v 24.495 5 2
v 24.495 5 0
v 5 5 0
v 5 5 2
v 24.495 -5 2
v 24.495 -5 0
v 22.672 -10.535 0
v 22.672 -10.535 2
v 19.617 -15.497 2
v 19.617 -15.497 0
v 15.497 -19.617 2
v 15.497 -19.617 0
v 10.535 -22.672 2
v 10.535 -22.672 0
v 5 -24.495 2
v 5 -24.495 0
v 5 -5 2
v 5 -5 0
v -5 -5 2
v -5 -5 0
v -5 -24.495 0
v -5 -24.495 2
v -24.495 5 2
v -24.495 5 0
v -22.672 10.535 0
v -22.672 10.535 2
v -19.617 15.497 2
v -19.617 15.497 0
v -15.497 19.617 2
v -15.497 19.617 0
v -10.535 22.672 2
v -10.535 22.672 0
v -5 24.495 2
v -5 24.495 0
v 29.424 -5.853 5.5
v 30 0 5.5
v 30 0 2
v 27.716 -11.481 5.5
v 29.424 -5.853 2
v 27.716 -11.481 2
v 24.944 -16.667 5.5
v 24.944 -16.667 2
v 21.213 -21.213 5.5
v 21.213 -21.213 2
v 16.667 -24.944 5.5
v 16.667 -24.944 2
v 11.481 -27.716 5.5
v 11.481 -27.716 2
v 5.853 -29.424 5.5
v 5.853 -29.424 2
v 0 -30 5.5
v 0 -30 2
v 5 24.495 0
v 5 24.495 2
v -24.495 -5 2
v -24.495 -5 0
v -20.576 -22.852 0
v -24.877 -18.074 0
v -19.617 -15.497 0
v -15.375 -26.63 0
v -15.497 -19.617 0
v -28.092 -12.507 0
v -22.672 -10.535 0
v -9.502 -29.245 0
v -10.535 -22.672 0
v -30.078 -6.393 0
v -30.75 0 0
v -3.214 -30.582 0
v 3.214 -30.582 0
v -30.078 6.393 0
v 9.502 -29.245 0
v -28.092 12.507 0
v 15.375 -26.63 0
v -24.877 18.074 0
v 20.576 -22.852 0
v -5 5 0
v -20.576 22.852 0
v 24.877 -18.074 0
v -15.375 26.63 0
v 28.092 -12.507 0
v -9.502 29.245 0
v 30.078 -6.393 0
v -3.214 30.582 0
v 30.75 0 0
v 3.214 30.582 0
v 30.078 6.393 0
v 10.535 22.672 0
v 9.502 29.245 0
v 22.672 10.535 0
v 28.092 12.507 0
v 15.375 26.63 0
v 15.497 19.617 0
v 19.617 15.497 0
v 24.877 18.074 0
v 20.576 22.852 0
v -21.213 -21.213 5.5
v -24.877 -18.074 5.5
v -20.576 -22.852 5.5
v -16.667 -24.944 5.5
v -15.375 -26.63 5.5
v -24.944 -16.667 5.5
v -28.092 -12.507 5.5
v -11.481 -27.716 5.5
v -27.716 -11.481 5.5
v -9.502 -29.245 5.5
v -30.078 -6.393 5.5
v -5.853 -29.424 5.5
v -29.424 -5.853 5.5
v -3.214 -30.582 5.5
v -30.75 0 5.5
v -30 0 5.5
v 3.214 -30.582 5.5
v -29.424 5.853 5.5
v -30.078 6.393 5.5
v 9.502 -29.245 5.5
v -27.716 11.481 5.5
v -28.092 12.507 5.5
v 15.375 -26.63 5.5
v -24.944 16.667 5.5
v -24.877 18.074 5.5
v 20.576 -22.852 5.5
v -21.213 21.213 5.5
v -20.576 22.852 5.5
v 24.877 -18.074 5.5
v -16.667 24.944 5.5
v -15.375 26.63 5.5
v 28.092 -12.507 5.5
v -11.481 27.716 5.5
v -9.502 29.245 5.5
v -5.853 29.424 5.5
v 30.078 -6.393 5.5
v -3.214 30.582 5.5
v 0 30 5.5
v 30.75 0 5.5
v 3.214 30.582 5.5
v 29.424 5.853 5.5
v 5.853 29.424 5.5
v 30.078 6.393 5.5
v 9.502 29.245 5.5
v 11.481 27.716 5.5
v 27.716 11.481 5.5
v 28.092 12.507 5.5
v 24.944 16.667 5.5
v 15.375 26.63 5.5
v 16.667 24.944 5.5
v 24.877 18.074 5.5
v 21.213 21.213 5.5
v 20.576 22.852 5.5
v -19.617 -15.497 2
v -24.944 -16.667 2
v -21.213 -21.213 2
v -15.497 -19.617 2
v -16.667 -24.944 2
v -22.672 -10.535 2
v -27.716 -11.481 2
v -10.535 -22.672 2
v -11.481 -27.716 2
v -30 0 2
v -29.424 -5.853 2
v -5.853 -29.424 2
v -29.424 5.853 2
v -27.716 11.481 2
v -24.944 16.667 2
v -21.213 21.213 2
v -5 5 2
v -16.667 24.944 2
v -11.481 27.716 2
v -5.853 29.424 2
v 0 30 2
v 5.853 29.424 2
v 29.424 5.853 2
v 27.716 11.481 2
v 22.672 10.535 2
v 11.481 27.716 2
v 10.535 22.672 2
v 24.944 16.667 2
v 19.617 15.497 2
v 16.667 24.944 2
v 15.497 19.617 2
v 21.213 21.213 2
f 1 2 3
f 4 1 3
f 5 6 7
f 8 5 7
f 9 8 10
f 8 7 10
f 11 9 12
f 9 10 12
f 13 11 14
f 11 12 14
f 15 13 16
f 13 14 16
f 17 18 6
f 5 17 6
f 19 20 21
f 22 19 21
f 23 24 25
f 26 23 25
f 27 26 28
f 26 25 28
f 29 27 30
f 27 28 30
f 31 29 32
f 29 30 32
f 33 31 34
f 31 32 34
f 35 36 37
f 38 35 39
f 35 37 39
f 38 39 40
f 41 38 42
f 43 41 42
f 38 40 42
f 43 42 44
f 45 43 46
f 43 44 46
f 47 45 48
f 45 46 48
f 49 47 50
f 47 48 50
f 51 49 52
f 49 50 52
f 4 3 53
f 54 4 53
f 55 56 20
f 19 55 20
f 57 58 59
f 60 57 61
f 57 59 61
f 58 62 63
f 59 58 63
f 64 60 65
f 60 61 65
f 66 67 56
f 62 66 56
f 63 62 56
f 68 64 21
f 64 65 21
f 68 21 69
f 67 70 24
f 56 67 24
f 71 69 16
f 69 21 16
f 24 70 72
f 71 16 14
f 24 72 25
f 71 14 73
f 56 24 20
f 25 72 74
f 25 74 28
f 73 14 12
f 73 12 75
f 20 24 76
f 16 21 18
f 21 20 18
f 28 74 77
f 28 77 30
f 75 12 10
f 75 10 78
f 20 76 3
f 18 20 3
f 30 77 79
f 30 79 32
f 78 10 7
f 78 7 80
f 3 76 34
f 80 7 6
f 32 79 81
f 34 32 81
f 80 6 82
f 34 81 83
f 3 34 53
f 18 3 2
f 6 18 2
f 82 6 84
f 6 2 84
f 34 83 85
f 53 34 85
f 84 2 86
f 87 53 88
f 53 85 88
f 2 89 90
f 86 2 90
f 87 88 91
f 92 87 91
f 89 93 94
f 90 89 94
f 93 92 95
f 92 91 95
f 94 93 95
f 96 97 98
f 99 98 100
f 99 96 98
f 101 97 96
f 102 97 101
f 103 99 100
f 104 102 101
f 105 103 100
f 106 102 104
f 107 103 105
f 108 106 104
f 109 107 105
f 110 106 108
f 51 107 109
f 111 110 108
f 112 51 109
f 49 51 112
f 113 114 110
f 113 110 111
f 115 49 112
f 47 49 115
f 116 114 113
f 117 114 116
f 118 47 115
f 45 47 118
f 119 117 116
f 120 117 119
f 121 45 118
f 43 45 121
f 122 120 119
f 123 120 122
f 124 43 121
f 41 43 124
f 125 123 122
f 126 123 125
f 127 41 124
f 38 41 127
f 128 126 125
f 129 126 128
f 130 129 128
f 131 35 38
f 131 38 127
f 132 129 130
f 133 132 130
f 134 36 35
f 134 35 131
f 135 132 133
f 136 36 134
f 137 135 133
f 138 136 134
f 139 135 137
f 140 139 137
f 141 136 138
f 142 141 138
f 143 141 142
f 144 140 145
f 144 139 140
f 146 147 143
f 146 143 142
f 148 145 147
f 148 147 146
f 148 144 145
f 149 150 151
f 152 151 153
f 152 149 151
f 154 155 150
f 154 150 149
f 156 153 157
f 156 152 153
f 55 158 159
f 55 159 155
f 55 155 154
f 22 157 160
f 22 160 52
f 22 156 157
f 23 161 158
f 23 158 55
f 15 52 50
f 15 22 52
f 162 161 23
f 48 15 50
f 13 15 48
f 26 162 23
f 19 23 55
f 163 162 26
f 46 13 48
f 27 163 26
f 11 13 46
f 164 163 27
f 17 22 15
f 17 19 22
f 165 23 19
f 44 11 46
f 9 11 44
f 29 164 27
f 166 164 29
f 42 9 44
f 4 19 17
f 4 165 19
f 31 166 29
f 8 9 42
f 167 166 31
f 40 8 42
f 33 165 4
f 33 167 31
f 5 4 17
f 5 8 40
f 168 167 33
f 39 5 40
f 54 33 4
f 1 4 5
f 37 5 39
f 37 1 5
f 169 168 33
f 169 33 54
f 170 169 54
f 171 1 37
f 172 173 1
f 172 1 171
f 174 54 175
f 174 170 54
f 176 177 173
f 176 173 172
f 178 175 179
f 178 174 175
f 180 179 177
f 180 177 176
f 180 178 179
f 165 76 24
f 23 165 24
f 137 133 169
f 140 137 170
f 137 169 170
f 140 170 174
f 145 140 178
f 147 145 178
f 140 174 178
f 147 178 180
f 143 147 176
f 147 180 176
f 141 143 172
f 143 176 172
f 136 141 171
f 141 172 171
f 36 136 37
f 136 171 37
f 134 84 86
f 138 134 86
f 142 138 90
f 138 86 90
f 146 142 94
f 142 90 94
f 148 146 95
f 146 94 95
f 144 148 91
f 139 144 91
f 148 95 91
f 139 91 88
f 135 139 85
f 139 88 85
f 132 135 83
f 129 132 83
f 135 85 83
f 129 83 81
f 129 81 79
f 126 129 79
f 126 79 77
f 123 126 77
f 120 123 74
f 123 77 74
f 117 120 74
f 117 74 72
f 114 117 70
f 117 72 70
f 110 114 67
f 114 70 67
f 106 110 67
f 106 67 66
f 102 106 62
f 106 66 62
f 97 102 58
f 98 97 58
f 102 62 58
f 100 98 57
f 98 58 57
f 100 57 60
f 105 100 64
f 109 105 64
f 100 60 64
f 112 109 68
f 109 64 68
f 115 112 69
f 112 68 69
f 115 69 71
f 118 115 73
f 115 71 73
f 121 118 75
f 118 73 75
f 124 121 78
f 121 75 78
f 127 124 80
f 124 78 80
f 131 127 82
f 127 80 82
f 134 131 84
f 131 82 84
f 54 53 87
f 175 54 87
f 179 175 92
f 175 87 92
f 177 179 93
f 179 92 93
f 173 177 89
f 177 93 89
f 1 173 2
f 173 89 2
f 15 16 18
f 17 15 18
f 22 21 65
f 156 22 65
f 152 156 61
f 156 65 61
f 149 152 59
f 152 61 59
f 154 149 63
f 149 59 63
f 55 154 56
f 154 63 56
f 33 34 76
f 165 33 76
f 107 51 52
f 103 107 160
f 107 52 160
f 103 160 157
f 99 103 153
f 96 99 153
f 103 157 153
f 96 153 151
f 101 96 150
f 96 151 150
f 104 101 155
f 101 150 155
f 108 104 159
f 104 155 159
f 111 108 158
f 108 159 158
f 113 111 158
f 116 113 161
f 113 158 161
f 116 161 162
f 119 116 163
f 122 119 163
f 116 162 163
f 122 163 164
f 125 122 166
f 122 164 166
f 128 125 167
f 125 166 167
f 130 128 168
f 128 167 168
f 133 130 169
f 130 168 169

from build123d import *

# Parameters (mm, degrees)
F0_R     = 30.75
F1_DEPTH = 5.5
F2_DEPTH = 2


with BuildPart() as f1:
    # F0 (on Top) → F1 (new body)
    with BuildSketch(Plane.XY):
        Circle(F0_R)
        with BuildLine():
            ThreePointArc((0, -30), (-21.213203, -21.213203), (-30, 0))
            ThreePointArc((-30, 0), (-21.213203, 21.213203), (0, 30))
            ThreePointArc((0, 30), (21.213203, 21.213203), (30, 0))
            ThreePointArc((30, 0), (21.213203, -21.213203), (0, -30))
        make_face(mode=Mode.SUBTRACT)
    extrude(amount=F1_DEPTH)

    # F0 (on Top) → F2 (join)
    with BuildSketch(Plane.XY):
        with BuildLine():
            Line((-30, 0), (0, 0))
            Line((0, 0), (0, 30))
            ThreePointArc((0, 30), (-21.213203, 21.213203), (-30, 0))
        make_face()
        with BuildLine():
            Line((-5, 24.494897), (-5, 5))
            Line((-5, 5), (-24.494897, 5))
            ThreePointArc((-24.494897, 5), (-17.67767, 17.67767), (-5, 24.494897))
        make_face(mode=Mode.SUBTRACT)
        with BuildLine():
            Line((0, 30), (0, 0))
            Line((0, 0), (30, 0))
            ThreePointArc((30, 0), (21.213203, 21.213203), (0, 30))
        make_face()
        with BuildLine():
            Line((24.494897, 5), (5, 5))
            Line((5, 5), (5, 24.494897))
            ThreePointArc((5, 24.494897), (17.67767, 17.67767), (24.494897, 5))
        make_face(mode=Mode.SUBTRACT)
        with BuildLine():
            Line((30, 0), (0, 0))
            Line((0, 0), (0, -30))
            ThreePointArc((0, -30), (21.213203, -21.213203), (30, 0))
        make_face()
        with BuildLine():
            Line((5, -24.494897), (5, -5))
            Line((5, -5), (24.494897, -5))
            ThreePointArc((24.494897, -5), (17.67767, -17.67767), (5, -24.494897))
        make_face(mode=Mode.SUBTRACT)
        with BuildLine():
            Line((0, -30), (0, 0))
            Line((0, 0), (-30, 0))
            ThreePointArc((-30, 0), (-21.213203, -21.213203), (0, -30))
        make_face()
        with BuildLine():
            Line((-24.494897, -5), (-5, -5))
            Line((-5, -5), (-5, -24.494897))
            ThreePointArc((-5, -24.494897), (-17.67767, -17.67767), (-24.494897, -5))
        make_face(mode=Mode.SUBTRACT)
    extrude(amount=F2_DEPTH)


solid = f1.part
